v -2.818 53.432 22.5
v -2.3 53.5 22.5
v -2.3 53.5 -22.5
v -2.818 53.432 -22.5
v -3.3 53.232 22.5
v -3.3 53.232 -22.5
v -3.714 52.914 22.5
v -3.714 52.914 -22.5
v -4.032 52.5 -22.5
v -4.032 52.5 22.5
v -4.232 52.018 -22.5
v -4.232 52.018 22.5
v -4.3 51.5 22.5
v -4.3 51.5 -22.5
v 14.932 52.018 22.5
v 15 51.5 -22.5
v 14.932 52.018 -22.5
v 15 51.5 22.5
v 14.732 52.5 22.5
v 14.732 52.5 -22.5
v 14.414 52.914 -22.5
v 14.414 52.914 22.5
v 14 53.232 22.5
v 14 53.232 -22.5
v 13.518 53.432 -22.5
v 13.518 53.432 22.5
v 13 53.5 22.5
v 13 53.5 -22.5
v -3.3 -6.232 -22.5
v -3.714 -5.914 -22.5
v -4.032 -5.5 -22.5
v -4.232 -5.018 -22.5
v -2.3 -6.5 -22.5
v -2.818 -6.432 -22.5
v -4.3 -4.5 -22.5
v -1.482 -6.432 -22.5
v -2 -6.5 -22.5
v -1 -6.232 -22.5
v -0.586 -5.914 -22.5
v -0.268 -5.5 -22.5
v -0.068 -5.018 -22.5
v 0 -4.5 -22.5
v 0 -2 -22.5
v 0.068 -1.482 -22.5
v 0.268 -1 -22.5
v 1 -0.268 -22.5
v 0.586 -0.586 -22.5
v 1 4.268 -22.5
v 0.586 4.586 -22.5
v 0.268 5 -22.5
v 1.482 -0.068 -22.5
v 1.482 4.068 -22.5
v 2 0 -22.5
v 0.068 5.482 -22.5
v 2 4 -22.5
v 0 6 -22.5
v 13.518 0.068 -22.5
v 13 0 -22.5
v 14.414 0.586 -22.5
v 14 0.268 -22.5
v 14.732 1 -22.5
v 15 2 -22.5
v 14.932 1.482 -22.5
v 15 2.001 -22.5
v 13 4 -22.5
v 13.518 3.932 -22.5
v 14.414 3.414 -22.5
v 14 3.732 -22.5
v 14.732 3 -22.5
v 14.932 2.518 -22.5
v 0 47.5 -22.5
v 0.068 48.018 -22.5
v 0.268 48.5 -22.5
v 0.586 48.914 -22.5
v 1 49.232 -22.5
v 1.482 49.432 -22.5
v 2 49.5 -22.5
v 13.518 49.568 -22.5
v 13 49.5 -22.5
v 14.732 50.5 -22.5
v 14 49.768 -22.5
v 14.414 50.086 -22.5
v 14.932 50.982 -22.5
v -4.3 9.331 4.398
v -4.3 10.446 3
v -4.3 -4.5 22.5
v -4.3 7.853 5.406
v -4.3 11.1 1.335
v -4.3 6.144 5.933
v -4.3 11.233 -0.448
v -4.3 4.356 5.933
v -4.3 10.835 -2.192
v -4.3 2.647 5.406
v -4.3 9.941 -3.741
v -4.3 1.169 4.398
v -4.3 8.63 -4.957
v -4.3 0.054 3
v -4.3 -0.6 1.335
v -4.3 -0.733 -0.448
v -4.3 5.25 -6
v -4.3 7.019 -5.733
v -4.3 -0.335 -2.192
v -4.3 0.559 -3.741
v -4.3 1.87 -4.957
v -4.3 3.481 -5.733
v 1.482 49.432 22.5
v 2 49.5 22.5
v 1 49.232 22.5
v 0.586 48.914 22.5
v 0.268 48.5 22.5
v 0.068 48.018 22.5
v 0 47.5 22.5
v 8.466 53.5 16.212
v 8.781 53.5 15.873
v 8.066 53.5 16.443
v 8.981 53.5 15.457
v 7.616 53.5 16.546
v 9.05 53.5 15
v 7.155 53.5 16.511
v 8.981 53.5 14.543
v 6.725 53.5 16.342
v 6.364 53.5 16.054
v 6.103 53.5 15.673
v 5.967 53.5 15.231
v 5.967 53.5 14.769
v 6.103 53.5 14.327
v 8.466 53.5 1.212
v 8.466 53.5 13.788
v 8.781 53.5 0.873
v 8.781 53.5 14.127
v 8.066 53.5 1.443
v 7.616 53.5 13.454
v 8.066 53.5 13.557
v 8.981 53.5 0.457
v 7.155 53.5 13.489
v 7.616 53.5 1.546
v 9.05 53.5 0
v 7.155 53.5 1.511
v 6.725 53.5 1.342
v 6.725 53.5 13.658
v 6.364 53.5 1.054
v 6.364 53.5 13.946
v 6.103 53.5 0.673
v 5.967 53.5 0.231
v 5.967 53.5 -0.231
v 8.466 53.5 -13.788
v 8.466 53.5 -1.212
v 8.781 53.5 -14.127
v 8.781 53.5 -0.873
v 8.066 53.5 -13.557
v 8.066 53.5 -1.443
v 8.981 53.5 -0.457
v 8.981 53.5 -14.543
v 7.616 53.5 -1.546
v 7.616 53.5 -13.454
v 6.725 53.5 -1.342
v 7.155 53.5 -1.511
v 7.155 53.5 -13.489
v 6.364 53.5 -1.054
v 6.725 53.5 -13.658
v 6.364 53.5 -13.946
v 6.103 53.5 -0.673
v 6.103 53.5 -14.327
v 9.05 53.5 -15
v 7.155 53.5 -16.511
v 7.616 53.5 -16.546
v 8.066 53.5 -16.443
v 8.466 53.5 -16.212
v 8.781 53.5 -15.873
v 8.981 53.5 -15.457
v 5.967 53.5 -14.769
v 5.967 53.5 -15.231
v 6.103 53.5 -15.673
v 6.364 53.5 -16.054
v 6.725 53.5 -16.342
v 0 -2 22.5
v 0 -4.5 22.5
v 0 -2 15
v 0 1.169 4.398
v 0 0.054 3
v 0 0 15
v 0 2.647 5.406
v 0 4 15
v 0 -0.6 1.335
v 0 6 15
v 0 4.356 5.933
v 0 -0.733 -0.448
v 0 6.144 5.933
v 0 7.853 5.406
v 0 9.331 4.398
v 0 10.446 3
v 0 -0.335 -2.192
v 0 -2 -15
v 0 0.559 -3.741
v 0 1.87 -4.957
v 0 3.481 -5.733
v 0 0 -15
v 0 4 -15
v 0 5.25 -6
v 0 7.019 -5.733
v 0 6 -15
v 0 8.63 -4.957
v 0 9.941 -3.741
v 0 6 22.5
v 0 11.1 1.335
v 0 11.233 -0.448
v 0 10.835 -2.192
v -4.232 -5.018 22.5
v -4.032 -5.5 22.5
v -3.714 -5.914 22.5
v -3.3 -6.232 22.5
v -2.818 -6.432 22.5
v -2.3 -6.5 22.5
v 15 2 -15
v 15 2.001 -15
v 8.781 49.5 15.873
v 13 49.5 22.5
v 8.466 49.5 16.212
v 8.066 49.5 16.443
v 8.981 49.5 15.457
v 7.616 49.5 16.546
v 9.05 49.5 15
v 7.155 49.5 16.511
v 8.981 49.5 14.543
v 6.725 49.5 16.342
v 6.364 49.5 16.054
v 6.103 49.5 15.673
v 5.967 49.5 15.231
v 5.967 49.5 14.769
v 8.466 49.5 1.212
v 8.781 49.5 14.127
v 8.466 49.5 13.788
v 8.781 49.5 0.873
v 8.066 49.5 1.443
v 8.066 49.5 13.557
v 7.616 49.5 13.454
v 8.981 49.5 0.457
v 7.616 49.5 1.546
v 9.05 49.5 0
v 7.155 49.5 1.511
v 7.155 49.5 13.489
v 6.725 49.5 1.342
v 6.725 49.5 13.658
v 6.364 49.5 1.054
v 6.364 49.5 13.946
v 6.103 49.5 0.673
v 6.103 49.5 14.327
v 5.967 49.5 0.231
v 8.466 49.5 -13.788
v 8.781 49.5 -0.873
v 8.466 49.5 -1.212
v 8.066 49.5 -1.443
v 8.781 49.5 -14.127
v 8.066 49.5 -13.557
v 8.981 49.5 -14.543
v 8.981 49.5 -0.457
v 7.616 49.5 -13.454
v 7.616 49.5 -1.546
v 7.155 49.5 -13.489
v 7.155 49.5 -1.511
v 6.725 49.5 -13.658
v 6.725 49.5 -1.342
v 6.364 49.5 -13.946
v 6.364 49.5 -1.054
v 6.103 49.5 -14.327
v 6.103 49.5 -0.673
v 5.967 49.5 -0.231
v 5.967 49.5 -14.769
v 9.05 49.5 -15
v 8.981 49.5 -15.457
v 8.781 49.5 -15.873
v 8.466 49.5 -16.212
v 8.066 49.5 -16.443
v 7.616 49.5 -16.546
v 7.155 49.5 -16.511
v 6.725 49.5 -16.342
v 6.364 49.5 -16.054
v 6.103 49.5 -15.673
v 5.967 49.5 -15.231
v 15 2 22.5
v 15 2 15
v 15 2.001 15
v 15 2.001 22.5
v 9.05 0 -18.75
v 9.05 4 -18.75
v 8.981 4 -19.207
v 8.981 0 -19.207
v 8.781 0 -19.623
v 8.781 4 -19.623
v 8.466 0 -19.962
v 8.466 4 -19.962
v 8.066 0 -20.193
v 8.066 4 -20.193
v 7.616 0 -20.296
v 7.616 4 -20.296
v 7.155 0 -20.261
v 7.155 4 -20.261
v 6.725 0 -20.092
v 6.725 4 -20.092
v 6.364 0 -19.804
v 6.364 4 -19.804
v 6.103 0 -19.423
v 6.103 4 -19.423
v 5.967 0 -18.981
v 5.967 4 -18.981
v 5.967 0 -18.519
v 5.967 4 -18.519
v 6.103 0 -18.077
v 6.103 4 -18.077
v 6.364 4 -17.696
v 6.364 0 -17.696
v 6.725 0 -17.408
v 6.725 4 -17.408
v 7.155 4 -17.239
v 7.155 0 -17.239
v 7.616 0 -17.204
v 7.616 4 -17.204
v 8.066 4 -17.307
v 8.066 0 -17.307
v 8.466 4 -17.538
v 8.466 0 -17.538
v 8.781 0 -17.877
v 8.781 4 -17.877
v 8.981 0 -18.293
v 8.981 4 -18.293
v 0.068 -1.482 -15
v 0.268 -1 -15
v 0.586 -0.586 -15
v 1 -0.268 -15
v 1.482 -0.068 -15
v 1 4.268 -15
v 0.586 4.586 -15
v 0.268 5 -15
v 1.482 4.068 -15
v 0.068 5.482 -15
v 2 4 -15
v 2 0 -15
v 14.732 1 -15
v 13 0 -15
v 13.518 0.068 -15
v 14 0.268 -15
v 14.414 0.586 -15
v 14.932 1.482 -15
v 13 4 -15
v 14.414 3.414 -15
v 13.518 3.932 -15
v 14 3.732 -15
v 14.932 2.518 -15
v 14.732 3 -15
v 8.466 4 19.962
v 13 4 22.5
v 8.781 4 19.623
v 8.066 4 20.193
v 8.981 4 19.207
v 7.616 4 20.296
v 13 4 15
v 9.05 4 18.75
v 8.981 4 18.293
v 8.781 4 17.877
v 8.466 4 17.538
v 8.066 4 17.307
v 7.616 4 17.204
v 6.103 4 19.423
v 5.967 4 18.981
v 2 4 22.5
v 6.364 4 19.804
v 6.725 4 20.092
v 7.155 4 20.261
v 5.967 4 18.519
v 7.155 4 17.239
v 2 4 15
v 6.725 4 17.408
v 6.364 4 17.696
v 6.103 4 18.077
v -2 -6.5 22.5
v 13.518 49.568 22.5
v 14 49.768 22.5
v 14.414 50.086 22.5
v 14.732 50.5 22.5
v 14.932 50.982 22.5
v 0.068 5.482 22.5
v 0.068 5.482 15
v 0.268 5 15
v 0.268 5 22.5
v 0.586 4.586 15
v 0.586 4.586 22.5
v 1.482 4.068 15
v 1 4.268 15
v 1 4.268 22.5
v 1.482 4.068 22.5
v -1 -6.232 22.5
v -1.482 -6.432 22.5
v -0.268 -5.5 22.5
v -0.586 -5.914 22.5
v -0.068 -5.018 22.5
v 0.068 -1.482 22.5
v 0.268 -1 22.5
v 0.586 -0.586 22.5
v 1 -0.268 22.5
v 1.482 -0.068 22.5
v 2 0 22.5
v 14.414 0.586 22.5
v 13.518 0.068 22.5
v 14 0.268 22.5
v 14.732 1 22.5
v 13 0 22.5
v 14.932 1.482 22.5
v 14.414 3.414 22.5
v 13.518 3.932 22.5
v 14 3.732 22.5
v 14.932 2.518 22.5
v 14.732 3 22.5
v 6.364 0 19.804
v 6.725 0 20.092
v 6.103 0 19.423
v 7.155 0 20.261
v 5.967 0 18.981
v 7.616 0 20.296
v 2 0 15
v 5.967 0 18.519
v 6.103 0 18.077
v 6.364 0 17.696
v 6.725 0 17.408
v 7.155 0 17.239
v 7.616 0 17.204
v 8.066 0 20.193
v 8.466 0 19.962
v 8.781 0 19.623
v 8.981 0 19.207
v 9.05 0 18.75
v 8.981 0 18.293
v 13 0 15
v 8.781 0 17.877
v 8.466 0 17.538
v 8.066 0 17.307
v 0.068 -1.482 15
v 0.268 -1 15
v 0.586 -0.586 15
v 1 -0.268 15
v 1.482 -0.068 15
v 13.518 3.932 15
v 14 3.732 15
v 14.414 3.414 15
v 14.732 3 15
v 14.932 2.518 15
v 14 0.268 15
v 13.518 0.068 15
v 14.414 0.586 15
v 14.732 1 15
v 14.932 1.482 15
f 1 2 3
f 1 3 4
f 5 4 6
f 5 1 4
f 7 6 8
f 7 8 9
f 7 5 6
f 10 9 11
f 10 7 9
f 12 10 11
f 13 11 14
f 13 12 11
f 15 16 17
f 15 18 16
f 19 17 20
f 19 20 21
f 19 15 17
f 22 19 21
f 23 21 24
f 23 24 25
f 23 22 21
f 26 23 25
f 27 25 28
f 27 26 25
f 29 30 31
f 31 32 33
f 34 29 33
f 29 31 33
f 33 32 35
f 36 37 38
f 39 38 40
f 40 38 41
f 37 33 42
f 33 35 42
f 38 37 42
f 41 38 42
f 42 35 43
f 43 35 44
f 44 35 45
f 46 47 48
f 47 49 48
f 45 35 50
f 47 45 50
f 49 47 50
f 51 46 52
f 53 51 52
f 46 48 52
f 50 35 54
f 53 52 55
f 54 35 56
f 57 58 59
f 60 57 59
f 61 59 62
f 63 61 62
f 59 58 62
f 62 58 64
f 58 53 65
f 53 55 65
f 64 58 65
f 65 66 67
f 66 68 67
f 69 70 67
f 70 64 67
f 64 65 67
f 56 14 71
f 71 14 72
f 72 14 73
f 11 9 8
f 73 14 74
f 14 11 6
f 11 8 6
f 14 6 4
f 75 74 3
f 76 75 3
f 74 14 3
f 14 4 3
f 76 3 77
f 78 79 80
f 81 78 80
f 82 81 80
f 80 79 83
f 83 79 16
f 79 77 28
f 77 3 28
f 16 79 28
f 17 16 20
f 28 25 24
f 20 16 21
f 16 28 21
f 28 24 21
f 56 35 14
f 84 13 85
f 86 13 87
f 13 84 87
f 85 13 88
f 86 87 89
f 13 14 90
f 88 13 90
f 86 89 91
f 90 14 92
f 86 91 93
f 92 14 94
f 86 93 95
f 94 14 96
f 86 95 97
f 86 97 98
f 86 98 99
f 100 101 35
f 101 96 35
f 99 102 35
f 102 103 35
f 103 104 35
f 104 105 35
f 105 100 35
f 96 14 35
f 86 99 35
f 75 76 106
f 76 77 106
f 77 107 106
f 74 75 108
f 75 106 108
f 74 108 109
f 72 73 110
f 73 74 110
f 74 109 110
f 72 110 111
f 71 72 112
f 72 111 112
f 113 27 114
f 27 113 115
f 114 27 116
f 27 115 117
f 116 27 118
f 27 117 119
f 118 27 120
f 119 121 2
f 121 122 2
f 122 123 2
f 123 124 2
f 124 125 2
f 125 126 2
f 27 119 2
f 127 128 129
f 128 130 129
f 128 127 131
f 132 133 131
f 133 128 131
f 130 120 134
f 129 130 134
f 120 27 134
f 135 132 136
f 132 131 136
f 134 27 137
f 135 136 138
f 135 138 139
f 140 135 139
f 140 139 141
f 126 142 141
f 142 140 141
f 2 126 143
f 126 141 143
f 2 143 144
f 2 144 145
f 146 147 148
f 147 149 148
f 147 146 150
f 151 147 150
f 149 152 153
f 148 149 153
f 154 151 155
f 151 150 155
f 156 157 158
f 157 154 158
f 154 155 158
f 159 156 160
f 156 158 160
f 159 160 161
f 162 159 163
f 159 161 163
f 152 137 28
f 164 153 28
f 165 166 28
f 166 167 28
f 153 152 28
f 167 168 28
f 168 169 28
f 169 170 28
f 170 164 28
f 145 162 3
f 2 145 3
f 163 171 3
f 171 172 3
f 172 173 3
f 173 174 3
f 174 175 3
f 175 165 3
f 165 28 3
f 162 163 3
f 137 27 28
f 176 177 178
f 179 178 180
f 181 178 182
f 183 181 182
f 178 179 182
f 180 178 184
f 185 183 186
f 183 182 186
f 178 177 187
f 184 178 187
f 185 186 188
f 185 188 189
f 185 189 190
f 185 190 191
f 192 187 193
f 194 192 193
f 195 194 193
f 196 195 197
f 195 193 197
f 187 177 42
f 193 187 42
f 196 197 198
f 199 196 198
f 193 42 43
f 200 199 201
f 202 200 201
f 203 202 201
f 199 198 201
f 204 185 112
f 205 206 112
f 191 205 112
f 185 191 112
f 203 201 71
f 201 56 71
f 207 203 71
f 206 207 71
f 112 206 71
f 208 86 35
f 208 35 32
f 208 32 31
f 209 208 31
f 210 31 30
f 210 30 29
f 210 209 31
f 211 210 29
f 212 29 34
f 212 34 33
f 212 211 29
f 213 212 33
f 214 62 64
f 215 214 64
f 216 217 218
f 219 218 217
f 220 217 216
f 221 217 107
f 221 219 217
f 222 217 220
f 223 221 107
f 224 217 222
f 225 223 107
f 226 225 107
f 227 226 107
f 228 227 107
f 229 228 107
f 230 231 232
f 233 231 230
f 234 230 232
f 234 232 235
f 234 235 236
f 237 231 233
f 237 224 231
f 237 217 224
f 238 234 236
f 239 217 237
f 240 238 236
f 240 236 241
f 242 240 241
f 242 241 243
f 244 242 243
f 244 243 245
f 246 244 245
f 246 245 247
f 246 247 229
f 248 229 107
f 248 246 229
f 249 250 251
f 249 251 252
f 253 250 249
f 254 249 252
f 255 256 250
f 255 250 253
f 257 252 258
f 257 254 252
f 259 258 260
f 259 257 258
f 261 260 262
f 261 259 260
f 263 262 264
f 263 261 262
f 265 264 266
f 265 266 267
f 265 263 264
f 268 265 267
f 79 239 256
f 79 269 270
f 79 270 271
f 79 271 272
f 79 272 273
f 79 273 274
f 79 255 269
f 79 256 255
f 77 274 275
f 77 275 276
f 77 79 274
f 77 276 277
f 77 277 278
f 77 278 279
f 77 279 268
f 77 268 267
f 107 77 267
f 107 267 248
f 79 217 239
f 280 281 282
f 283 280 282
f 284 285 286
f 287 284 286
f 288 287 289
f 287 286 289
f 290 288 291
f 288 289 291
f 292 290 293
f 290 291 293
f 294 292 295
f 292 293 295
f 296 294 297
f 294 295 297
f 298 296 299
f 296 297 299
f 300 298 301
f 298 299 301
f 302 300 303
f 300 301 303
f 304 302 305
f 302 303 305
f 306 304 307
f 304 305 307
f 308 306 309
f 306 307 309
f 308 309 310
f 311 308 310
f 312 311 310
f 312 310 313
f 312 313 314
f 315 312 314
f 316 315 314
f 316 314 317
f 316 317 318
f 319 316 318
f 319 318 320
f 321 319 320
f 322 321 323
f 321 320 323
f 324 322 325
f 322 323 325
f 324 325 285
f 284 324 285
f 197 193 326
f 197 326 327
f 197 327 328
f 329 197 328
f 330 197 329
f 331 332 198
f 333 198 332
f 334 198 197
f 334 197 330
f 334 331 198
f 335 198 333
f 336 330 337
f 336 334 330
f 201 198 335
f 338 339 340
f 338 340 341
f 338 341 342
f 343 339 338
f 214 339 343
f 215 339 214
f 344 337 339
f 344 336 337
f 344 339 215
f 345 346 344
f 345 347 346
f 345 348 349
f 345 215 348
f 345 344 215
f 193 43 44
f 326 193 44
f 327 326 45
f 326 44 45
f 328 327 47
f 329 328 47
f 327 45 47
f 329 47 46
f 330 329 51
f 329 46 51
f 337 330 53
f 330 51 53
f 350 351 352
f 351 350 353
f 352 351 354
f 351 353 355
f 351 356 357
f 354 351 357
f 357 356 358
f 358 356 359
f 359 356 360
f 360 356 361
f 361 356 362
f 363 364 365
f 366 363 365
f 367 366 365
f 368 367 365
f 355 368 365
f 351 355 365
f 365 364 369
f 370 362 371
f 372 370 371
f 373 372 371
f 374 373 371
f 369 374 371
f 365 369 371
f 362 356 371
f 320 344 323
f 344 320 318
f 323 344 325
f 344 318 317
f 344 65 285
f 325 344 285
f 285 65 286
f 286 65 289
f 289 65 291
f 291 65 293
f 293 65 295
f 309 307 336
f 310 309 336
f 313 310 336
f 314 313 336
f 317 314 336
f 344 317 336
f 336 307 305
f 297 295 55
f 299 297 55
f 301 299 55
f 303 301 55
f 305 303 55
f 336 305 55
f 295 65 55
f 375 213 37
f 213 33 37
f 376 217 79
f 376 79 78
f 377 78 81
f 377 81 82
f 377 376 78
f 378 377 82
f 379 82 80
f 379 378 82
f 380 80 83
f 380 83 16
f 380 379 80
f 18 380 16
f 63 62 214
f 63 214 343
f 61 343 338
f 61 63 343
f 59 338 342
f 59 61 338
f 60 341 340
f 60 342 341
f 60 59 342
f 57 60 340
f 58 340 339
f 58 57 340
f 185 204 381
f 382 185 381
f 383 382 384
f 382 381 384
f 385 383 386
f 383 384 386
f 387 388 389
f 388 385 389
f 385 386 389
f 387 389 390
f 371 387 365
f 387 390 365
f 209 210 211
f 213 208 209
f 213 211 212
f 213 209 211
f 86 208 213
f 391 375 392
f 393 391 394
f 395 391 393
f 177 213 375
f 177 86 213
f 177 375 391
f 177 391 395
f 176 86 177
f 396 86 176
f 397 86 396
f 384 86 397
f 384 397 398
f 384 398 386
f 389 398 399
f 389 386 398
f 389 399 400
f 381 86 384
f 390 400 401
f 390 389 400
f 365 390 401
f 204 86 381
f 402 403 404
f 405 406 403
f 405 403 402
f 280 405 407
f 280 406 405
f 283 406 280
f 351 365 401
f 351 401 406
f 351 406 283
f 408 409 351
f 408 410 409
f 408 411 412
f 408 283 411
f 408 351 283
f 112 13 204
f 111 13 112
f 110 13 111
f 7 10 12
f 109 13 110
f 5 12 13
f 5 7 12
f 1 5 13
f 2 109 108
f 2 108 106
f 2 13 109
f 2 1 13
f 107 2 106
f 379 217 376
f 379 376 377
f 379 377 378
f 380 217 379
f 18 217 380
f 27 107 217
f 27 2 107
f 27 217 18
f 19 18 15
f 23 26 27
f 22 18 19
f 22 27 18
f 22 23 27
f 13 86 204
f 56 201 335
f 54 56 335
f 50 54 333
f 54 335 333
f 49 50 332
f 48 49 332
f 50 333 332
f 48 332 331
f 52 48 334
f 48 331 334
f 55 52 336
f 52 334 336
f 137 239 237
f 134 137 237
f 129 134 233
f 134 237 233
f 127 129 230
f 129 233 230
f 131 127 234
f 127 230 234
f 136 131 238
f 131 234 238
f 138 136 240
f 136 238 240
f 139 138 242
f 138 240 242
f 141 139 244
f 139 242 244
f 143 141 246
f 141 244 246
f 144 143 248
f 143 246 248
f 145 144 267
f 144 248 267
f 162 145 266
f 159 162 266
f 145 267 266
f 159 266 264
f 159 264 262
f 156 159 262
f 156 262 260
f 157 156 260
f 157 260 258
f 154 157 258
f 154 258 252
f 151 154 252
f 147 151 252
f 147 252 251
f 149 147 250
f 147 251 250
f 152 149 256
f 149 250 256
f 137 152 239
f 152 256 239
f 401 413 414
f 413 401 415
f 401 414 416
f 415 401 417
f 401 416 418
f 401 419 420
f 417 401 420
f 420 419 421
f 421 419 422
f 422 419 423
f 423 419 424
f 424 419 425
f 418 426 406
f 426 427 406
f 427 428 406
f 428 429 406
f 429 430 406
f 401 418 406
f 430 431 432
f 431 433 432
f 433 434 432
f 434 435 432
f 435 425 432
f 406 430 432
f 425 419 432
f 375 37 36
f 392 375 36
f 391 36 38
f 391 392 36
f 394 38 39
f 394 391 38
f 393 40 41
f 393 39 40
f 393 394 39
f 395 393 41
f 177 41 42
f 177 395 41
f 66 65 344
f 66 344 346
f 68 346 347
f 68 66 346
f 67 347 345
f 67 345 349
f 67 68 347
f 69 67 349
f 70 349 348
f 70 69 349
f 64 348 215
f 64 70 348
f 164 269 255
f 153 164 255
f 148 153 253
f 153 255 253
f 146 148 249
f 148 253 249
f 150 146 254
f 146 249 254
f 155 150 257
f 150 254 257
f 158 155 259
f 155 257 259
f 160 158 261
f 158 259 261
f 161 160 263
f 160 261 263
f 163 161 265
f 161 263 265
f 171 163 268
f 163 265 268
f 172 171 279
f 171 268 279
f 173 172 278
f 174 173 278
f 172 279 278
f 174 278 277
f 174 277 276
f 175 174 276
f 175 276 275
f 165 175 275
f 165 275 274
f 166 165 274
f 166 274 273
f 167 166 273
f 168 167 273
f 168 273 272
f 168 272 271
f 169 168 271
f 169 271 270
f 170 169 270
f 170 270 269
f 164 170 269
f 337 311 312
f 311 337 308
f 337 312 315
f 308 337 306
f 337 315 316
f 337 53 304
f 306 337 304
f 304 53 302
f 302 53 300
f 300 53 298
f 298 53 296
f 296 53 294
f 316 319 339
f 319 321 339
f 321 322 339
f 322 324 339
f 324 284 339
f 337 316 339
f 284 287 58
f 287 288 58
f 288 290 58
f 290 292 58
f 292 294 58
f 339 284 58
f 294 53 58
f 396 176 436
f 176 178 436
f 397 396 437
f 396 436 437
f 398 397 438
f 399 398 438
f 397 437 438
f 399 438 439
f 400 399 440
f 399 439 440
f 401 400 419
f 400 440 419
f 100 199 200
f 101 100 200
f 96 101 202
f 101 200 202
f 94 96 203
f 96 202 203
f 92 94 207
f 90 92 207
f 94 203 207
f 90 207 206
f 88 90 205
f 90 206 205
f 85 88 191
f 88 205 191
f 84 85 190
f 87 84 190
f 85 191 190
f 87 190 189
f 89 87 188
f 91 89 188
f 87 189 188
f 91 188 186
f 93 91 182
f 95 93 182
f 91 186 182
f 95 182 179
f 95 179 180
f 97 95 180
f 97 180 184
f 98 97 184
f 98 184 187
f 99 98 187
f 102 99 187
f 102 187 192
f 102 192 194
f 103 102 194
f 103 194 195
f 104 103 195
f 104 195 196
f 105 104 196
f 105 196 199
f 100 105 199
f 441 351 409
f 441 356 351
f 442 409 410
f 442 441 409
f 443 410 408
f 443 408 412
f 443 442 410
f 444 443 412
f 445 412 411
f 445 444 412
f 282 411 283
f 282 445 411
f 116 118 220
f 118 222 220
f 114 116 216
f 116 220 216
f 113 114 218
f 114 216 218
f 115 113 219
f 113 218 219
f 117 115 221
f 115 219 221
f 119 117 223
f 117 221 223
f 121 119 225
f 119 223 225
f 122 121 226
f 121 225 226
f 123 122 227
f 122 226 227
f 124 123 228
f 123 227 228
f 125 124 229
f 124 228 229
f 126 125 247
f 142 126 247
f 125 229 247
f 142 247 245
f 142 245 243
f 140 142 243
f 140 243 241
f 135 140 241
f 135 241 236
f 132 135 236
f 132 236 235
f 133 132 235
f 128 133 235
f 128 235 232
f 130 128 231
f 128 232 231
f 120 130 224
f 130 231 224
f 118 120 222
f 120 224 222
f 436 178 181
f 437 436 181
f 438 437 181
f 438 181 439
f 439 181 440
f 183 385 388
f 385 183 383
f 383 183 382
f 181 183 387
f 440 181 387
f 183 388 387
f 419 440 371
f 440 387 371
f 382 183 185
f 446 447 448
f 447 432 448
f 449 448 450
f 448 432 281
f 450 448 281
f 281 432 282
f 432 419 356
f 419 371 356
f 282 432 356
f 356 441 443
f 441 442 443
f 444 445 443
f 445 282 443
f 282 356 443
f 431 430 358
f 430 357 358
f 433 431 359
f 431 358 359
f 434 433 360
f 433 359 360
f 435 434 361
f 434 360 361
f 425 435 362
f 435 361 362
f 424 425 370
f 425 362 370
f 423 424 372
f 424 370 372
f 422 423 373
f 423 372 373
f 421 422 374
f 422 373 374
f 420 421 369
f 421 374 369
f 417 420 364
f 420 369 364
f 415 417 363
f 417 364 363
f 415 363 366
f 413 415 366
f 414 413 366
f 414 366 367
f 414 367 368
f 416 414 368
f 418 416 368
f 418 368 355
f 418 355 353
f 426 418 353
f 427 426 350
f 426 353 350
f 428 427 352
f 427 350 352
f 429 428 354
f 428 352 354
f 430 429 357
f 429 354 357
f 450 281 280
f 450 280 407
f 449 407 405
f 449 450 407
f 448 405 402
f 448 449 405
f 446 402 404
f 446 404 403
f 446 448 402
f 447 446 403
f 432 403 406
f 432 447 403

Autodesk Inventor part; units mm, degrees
ref_plane "YZ Plane" through (0, 0, 0) normal (1, 0, 0) x (0, 1, 0)
ref_plane "XZ Plane" through (0, 0, 0) normal (0, 1, 0) x (-1, 0, 0)
ref_plane "XY Plane" through (0, 0, 0) normal (0, 0, 1) x (1, 0, 0)
sketch "Sketch1" plane through (0, 0, 0) normal (0, 0, 1) x (1, 0, 0)
  line L0 (0, 0) -> (15, 0)
  line L1 (15, 0) -> (15, 4)
  line L2 (15, 4) -> (0, 4)
  line L3 (0, 4) -> (0, 0)
  line L4 (0, 53.5) -> (15, 53.5)
  line L5 (15, 53.5) -> (15, 49.5)
  line L6 (15, 49.5) -> (0, 49.5)
  line L7 (0, 49.5) -> (0, 53.5)
  line L8 (0, 53.5) -> (-4.3, 53.5)
  line L9 (-4.3, 53.5) -> (-4.3, -6.5)
  line L10 (-4.3, -6.5) -> (0, -6.5)
  line L11 (0, -6.5) -> (0, 53.5)
  point P0 (0, 49.5)
  dimension "d0" = 15
  dimension "d1" = 4
  dimension "d2" = 15
  dimension "d3" = 4
  dimension "d4" = 45.5
  dimension "d5" = 4.3
  dimension "d6" = 60
extrude "Extrusion1" add sketch "Sketch1" along normal mid plane 45
extrude "Extrusion2" cut sketch "Sketch1" along normal mid plane 30 contours L3 L2 L1 L0
sketch "Sketch3" plane through (0, 49.5, 22.5) normal (0, -1, 0) x (1, 0, 0)
  line L0 (0, 0) -> (15, 0) projected
  line L1 (7.5, 0) -> (7.5, -45)
  line L2 (15, -45) -> (0, -45) projected
  circle A0 centre (7.5, -3.75) radius 1.55
  circle A1 centre (7.5, -7.5) radius 1.55
  circle A2 centre (7.5, -22.5) radius 1.55
  circle A3 centre (7.5, -37.5) radius 1.55
  circle A4 centre (7.5, -41.25) radius 1.55
  line L3 (0, 0) -> (15, 0) projected
  line L4 (15, -45) -> (0, -45) projected
  line L5 (15, -45) -> (15, 0) projected
  point P0 (0, -22.5)
  dimension "d11" = 3.1
  dimension "d12" = 3.1
  dimension "d13" = 3.1
  dimension "d14" = 3.1
  dimension "d15" = 3.1
  dimension "d16" = 3.75
  dimension "d17" = 7.5
  dimension "d18" = 3.75
  dimension "d19" = 7.5
  dimension "d20" = 7.5
extrude "Extrusion3" cut sketch "Sketch3" along normal through all contours A0 L1 | L1 A0 | A4 L1 | L1 A4
extrude "Extrusion4" cut sketch "Sketch3" against normal through all contours A1 L1 | L1 A1 | A2 L1 | L1 A2 | A3 L1 | L1 A3
sketch "Sketch4" plane through (0, 4, -22.5) normal (1, 0, 0) x (0, 0, -1)
  circle A0 centre (-22.5, 1.25) radius 6
  line L0 (-45, -10.5) -> (0, -10.5) projected
  line L1 (-22.5, 1.25) -> (-22.5, -10.5) construction
  point P0 (-22.5, -4)
  dimension "d29" = 12
  dimension "d40" = 11.75
extrude "Extrusion6" cut sketch "Sketch4" against normal through all
fillet "Fillet1" radius 2 14 edges at (0, 49.5, 0) (15, 49.5, 0) (15, 53.5, 0) (-4.3, 53.5, 0) (0, 4, 18.75) (0, 4, -18.75) (15, 4, -18.75) (15, 0, -18.75) (15, 4, 18.75) (15, 0, 18.75) (0, -6.5, 0) (0, 0, 18.75) (0, 0, -18.75) (-4.3, -6.5, 0)
properties part number "BearingBracket" material "PC/ABS Plastic"
